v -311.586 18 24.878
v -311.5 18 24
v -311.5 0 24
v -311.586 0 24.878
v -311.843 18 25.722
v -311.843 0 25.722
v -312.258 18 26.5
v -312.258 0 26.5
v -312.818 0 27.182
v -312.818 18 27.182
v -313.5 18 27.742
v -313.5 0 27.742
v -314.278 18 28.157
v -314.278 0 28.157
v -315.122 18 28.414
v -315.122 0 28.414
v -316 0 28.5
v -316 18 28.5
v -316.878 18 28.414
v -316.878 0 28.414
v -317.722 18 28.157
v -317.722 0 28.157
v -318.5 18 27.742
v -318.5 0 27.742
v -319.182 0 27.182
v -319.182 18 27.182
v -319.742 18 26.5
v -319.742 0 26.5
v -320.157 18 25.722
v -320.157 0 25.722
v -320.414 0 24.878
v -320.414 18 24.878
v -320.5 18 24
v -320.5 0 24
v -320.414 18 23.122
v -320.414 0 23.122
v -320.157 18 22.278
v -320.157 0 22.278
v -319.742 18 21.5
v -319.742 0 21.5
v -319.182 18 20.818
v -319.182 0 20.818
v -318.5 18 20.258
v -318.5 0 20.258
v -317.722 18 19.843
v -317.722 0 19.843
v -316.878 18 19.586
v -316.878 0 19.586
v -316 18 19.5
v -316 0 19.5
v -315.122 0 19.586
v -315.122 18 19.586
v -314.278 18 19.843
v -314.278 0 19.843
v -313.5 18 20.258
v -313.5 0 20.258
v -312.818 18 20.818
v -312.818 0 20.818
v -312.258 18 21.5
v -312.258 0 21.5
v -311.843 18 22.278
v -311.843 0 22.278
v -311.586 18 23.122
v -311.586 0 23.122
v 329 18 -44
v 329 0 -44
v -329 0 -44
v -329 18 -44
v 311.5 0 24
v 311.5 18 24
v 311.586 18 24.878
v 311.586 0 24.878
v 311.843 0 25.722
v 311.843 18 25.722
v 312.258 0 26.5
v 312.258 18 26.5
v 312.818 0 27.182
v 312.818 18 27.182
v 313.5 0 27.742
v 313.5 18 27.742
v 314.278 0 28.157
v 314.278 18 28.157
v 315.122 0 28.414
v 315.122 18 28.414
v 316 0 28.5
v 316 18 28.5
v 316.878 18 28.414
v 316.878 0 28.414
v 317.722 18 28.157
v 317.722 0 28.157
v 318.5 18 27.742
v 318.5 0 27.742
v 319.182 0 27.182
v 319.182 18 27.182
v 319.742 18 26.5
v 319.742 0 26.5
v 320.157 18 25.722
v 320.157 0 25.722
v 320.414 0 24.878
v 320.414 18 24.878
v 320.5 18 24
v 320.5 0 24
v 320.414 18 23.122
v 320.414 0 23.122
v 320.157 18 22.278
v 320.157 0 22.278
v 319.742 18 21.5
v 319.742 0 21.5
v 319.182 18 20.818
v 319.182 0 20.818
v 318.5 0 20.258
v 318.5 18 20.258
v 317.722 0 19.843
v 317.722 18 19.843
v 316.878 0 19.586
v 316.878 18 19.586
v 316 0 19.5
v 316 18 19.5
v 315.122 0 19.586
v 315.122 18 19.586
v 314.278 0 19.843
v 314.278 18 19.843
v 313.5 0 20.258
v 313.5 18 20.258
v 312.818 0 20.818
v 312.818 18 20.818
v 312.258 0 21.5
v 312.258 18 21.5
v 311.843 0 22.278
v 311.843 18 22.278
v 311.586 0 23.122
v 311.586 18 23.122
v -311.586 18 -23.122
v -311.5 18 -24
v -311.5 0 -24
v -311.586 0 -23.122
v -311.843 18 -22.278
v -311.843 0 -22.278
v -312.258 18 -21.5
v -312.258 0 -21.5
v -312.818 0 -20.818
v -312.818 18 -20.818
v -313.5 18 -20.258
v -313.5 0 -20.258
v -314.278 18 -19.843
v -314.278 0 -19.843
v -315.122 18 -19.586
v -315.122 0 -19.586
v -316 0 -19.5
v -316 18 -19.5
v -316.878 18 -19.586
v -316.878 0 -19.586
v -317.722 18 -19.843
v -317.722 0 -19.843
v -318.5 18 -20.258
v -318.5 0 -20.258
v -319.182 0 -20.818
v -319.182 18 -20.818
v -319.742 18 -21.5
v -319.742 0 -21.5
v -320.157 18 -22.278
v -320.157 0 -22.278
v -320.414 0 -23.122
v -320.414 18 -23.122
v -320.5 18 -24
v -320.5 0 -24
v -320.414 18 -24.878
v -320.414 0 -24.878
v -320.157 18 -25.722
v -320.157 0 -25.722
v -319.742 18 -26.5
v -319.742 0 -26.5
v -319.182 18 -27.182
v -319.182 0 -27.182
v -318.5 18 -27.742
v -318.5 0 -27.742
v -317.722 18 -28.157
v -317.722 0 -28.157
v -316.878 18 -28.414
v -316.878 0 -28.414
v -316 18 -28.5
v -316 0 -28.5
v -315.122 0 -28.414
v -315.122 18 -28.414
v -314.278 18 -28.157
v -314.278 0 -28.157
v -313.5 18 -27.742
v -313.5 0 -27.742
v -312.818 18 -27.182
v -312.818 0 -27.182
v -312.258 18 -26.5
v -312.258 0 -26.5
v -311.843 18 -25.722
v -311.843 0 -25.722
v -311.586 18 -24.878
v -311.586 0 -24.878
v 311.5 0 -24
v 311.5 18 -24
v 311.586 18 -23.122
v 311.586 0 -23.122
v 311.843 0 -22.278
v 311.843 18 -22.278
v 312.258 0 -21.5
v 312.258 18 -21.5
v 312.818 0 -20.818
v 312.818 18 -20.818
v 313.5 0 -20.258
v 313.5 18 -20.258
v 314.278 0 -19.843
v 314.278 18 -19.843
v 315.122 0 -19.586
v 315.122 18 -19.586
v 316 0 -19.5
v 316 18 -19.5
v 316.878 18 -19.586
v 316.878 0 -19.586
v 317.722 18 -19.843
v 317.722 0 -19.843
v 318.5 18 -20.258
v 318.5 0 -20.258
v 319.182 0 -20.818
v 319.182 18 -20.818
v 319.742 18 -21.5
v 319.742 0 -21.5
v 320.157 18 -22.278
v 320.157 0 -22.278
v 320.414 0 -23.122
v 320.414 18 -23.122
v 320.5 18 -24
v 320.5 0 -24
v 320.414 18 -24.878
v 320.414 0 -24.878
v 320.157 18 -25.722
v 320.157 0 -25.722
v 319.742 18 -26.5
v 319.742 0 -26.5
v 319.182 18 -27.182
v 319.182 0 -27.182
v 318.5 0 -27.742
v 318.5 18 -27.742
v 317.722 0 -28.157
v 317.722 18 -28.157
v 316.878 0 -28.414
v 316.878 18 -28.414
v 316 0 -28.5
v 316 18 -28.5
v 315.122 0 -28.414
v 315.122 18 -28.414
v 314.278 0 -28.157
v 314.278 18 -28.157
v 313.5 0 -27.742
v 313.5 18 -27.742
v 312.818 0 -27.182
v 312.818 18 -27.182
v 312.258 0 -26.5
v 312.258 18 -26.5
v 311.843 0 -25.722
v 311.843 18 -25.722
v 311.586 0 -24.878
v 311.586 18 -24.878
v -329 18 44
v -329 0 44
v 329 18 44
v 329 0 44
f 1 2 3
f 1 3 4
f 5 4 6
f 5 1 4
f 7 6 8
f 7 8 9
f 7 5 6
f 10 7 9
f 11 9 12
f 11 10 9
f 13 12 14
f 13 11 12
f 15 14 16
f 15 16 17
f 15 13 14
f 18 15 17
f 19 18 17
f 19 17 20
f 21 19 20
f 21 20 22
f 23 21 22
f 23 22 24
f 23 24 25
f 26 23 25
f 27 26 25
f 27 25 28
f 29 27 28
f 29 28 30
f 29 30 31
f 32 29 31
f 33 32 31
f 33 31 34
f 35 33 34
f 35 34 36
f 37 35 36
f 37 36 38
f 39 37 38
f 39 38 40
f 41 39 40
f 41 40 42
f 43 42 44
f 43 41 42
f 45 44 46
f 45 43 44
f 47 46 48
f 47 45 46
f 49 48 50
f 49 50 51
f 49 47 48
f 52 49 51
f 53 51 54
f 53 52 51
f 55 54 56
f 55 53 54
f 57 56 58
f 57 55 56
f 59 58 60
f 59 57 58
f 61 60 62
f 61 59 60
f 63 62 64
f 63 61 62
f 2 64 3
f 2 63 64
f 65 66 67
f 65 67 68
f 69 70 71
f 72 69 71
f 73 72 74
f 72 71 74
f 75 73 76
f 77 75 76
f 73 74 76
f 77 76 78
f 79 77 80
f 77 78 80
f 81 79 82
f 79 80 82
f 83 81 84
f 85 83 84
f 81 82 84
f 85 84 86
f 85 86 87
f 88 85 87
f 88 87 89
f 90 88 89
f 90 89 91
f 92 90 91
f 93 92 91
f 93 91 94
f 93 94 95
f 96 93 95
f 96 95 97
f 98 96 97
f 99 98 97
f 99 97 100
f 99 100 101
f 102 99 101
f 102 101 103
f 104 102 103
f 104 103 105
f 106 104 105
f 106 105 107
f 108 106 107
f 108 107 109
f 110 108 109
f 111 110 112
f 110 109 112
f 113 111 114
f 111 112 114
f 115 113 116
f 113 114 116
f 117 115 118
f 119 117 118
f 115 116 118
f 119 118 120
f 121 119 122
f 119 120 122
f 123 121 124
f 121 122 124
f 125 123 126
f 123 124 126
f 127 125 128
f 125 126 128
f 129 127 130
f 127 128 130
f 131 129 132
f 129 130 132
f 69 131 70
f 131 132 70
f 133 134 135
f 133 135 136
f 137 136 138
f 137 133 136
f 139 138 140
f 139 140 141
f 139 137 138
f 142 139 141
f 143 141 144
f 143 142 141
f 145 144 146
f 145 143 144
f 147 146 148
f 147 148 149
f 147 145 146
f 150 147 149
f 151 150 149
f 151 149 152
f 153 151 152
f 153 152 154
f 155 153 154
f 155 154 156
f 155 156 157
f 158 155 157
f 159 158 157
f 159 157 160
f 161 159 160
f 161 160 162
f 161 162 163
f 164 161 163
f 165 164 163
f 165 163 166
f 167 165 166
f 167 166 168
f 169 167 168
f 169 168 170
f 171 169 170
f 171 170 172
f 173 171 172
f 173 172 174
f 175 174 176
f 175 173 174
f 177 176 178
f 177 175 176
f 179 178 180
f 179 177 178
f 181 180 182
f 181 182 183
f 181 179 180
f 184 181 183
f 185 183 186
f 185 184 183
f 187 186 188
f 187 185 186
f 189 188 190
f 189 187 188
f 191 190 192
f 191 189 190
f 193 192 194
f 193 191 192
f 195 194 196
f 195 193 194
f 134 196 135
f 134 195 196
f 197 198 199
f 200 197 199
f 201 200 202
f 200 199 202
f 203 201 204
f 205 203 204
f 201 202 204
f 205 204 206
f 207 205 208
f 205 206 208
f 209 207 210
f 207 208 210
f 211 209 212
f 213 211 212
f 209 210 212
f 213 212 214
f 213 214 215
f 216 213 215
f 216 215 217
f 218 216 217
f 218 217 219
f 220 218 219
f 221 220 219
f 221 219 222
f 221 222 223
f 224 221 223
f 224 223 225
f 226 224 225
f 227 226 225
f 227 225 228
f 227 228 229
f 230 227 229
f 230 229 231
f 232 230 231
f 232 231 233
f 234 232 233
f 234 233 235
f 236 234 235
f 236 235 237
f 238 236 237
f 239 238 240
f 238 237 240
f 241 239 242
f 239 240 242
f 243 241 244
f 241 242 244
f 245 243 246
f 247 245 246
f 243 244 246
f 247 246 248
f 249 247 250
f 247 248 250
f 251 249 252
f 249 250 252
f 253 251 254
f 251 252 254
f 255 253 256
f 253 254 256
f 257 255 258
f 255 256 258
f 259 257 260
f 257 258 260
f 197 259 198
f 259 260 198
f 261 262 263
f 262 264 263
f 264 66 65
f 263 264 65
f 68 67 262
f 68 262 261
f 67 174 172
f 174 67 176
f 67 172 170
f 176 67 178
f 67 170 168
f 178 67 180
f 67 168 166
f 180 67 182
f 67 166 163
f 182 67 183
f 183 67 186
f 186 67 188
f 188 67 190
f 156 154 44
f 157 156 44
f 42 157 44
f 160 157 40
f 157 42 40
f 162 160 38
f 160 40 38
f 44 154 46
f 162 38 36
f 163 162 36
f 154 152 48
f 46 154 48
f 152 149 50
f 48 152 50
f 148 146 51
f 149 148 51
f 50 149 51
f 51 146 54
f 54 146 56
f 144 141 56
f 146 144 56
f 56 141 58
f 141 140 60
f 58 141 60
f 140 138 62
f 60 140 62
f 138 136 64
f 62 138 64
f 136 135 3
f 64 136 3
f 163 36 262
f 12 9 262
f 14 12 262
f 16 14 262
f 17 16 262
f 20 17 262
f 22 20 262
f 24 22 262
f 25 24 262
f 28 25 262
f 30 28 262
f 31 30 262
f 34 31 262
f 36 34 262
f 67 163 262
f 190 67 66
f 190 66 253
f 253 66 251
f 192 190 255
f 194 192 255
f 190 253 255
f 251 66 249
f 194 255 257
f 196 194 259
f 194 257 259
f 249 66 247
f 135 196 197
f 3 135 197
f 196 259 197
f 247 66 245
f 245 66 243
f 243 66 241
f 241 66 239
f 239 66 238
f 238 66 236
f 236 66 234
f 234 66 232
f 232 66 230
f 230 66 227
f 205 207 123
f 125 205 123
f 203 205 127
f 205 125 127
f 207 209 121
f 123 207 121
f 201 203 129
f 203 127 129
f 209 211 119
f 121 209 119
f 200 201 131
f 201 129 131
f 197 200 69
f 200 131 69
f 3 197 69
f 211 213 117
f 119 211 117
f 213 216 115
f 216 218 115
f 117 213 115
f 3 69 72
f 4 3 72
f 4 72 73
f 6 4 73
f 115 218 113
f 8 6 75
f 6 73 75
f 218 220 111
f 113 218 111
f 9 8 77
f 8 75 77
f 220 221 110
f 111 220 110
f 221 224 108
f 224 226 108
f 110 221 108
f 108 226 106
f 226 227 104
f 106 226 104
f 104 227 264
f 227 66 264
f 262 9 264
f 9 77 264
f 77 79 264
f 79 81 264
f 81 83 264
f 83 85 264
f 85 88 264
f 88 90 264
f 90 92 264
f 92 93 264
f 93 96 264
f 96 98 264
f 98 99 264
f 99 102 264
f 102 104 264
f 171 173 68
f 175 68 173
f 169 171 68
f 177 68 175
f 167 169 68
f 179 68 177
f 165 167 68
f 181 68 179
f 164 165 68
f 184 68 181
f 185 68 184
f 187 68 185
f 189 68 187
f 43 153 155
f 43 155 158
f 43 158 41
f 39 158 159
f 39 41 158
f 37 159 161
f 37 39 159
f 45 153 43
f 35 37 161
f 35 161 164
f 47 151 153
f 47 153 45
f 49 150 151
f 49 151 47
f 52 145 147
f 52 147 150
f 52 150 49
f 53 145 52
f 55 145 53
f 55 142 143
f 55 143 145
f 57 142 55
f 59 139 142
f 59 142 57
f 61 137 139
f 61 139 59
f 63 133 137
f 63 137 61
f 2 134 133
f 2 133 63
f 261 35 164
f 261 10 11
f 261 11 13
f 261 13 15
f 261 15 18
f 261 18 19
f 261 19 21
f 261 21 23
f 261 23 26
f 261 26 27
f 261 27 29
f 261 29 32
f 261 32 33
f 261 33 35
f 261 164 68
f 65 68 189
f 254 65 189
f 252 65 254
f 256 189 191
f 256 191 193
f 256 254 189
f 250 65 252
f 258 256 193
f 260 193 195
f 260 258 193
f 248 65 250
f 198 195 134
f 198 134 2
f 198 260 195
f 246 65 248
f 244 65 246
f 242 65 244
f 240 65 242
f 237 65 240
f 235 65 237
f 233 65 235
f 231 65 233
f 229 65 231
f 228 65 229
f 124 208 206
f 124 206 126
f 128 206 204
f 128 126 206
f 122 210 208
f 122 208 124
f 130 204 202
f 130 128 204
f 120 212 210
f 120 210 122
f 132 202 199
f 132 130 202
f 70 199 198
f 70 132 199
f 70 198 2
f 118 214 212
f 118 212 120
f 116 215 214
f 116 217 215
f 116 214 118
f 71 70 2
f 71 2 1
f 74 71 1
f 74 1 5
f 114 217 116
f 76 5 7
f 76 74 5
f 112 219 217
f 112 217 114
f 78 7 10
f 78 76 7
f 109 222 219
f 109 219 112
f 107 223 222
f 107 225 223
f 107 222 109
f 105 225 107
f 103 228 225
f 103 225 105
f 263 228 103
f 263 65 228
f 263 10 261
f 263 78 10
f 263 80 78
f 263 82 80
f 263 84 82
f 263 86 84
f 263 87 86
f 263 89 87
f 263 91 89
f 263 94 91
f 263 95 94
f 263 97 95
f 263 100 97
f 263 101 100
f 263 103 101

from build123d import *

# Parameters (mm, degrees)
F0_W     = 18
F0_H     = 88
F1_DEPTH = 329
F2_R     = 4.5
F3_DEPTH = 18.001


with BuildPart() as f1:
    # F0 (on Right) → F1 (new body)
    with BuildSketch(Plane.YZ):
        with Locations((9, 0)):
            Rectangle(F0_W, F0_H)
    extrude(amount=F1_DEPTH)

    # F2 (on face) → F3 (cut, through all)
    with BuildSketch(Plane(origin=(0, 18, 0), x_dir=(-1, 0, 0), z_dir=(0, 1, 0))):
        with Locations((-316, 24)):
            Circle(F2_R)
        with Locations((-316, -24)):
            Circle(F2_R)
    extrude(amount=-F3_DEPTH, mode=Mode.SUBTRACT)

    # F4: F1 across plane


with BuildPart() as f1_1:
    add(f1.part)
    add(f1.part.mirror(Plane.YZ))


solid = f1_1.part
